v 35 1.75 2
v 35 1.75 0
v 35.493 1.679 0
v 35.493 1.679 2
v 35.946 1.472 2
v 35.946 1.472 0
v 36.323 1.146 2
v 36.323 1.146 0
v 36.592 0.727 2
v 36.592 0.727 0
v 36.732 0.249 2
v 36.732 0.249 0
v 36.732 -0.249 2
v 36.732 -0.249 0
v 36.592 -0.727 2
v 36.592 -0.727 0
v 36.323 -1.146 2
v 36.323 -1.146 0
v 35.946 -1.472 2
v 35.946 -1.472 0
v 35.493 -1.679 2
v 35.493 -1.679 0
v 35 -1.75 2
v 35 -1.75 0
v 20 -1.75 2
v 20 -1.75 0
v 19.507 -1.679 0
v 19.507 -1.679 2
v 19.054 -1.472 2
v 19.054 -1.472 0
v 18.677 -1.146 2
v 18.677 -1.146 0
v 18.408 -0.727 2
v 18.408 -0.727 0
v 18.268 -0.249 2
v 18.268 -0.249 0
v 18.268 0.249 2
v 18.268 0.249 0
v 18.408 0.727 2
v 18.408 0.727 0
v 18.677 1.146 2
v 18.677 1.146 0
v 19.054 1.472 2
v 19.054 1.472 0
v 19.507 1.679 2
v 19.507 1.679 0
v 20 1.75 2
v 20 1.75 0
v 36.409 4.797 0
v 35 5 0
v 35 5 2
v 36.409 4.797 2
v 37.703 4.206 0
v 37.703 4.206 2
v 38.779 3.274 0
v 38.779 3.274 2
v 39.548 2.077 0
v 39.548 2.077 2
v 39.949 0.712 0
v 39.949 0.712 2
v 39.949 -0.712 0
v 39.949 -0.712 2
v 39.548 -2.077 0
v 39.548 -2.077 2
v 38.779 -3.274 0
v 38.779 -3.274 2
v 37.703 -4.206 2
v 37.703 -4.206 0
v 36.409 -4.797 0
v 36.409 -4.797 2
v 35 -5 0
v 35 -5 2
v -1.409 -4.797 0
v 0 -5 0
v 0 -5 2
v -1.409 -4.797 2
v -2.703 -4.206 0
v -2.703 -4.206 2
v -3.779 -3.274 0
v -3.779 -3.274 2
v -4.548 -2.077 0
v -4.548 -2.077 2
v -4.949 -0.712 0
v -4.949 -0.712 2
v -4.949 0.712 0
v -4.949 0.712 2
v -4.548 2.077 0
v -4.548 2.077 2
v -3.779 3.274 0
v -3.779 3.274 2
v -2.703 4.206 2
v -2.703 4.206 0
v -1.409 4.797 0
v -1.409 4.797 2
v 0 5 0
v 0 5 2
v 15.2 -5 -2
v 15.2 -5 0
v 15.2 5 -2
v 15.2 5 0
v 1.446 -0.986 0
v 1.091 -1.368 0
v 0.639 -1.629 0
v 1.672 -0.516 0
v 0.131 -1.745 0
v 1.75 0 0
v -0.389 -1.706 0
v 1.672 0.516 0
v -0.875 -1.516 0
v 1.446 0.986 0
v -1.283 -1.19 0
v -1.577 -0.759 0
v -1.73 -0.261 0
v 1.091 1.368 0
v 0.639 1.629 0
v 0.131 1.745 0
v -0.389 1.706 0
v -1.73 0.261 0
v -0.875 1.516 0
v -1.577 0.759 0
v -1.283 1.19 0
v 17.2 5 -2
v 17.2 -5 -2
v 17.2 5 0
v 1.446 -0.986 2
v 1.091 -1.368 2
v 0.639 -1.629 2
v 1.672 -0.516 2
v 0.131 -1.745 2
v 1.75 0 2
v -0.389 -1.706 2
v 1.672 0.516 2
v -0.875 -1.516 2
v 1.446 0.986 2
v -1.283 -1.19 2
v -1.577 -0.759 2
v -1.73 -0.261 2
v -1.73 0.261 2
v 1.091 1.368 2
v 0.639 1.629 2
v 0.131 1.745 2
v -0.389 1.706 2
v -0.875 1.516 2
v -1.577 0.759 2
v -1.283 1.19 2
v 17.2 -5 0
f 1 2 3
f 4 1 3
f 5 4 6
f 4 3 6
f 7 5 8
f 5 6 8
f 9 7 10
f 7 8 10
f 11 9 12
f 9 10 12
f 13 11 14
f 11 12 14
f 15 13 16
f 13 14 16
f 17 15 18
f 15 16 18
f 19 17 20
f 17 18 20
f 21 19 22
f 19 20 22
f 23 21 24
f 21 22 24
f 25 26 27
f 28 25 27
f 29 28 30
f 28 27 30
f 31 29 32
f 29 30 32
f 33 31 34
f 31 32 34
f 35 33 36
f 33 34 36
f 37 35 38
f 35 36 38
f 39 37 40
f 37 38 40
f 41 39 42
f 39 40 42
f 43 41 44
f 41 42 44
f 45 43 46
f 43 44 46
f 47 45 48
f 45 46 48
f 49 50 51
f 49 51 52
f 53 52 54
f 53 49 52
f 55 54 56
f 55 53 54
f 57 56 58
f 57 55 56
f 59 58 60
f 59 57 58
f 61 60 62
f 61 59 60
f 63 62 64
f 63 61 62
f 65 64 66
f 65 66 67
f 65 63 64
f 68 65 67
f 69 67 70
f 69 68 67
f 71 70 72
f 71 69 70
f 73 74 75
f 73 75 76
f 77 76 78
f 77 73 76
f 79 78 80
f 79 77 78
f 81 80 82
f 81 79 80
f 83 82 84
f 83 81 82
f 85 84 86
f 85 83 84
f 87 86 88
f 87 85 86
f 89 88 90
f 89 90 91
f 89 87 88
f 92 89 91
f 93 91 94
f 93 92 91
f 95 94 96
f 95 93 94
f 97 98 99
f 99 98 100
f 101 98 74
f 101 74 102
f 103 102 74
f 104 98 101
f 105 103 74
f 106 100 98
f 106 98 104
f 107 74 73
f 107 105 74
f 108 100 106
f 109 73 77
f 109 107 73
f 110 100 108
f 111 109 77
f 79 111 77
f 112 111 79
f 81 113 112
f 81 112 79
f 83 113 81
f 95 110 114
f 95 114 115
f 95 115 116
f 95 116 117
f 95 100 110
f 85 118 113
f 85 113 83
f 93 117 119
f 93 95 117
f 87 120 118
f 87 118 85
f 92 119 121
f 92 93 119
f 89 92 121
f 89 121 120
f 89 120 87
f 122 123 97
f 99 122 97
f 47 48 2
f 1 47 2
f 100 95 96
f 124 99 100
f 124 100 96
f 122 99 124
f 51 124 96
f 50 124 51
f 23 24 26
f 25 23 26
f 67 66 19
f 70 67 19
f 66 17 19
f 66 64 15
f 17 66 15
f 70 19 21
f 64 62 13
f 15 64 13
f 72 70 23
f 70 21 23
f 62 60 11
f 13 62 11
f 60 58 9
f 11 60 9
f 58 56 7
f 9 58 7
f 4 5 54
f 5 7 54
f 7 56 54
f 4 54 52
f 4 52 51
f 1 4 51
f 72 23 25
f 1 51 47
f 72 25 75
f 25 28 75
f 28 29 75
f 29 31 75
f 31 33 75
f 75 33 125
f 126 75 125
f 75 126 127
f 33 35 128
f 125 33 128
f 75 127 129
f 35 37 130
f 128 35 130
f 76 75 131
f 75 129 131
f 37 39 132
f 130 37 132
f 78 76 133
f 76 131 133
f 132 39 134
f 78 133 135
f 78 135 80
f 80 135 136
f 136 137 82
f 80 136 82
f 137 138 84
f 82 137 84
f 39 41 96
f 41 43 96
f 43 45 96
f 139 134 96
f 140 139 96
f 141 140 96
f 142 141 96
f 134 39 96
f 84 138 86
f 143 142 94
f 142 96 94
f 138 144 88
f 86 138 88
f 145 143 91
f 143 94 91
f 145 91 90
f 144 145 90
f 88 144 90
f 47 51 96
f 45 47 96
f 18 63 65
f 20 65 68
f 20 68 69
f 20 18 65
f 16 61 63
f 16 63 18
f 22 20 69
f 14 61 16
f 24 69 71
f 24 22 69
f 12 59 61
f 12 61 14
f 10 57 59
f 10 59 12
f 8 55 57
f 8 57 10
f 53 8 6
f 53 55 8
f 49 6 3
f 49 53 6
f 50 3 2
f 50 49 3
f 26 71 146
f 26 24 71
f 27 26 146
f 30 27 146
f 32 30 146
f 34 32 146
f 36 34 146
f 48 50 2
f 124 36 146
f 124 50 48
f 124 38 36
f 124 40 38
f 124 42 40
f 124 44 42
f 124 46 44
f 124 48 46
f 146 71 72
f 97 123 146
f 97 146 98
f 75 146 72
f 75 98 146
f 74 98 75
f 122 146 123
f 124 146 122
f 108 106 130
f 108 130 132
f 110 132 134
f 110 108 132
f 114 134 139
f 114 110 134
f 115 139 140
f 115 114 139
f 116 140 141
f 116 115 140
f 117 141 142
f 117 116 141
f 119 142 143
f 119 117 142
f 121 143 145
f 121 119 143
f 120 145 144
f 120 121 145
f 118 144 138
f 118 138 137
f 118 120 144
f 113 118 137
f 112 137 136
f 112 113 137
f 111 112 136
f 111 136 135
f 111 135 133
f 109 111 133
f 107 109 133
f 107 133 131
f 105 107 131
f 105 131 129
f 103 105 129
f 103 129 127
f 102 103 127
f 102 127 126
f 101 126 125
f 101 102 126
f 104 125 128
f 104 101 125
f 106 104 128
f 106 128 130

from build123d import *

# Parameters (mm, degrees)
ESBO_O1_R                = 1.75
RESSALTO_EXTRUS_O1_DEPTH = 2
ESBO_O2_W                = 2
ESBO_O2_H                = 10
RESSALTO_EXTRUS_O2_DEPTH = 2


with BuildPart() as part:
    # Esboço1 → Ressalto-extrusão1 (new body)
    with BuildSketch(Plane.XY):
        with BuildLine():
            Line((0, 5), (35, 5))
            ThreePointArc((35, 5), (40, 0), (35, -5))
            Line((35, -5), (0, -5))
            ThreePointArc((0, -5), (-5, 0), (0, 5))
        make_face()
        Circle(ESBO_O1_R, mode=Mode.SUBTRACT)
        with BuildLine():
            Line((20, 1.75), (35, 1.75))
            ThreePointArc((35, 1.75), (36.75, 0), (35, -1.75))
            Line((35, -1.75), (20, -1.75))
            ThreePointArc((20, -1.75), (18.25, 0), (20, 1.75))
        make_face(mode=Mode.SUBTRACT)
    extrude(amount=RESSALTO_EXTRUS_O1_DEPTH)

    # Esboço2 → Ressalto-extrusão2 (add)
    with BuildSketch(Plane(origin=(0, 0, 0), x_dir=(-1, 0, 0), z_dir=(0, 0, -1))):
        with Locations((-16.2, 0)):
            Rectangle(ESBO_O2_W, ESBO_O2_H)
    extrude(amount=RESSALTO_EXTRUS_O2_DEPTH)


solid = part.part
